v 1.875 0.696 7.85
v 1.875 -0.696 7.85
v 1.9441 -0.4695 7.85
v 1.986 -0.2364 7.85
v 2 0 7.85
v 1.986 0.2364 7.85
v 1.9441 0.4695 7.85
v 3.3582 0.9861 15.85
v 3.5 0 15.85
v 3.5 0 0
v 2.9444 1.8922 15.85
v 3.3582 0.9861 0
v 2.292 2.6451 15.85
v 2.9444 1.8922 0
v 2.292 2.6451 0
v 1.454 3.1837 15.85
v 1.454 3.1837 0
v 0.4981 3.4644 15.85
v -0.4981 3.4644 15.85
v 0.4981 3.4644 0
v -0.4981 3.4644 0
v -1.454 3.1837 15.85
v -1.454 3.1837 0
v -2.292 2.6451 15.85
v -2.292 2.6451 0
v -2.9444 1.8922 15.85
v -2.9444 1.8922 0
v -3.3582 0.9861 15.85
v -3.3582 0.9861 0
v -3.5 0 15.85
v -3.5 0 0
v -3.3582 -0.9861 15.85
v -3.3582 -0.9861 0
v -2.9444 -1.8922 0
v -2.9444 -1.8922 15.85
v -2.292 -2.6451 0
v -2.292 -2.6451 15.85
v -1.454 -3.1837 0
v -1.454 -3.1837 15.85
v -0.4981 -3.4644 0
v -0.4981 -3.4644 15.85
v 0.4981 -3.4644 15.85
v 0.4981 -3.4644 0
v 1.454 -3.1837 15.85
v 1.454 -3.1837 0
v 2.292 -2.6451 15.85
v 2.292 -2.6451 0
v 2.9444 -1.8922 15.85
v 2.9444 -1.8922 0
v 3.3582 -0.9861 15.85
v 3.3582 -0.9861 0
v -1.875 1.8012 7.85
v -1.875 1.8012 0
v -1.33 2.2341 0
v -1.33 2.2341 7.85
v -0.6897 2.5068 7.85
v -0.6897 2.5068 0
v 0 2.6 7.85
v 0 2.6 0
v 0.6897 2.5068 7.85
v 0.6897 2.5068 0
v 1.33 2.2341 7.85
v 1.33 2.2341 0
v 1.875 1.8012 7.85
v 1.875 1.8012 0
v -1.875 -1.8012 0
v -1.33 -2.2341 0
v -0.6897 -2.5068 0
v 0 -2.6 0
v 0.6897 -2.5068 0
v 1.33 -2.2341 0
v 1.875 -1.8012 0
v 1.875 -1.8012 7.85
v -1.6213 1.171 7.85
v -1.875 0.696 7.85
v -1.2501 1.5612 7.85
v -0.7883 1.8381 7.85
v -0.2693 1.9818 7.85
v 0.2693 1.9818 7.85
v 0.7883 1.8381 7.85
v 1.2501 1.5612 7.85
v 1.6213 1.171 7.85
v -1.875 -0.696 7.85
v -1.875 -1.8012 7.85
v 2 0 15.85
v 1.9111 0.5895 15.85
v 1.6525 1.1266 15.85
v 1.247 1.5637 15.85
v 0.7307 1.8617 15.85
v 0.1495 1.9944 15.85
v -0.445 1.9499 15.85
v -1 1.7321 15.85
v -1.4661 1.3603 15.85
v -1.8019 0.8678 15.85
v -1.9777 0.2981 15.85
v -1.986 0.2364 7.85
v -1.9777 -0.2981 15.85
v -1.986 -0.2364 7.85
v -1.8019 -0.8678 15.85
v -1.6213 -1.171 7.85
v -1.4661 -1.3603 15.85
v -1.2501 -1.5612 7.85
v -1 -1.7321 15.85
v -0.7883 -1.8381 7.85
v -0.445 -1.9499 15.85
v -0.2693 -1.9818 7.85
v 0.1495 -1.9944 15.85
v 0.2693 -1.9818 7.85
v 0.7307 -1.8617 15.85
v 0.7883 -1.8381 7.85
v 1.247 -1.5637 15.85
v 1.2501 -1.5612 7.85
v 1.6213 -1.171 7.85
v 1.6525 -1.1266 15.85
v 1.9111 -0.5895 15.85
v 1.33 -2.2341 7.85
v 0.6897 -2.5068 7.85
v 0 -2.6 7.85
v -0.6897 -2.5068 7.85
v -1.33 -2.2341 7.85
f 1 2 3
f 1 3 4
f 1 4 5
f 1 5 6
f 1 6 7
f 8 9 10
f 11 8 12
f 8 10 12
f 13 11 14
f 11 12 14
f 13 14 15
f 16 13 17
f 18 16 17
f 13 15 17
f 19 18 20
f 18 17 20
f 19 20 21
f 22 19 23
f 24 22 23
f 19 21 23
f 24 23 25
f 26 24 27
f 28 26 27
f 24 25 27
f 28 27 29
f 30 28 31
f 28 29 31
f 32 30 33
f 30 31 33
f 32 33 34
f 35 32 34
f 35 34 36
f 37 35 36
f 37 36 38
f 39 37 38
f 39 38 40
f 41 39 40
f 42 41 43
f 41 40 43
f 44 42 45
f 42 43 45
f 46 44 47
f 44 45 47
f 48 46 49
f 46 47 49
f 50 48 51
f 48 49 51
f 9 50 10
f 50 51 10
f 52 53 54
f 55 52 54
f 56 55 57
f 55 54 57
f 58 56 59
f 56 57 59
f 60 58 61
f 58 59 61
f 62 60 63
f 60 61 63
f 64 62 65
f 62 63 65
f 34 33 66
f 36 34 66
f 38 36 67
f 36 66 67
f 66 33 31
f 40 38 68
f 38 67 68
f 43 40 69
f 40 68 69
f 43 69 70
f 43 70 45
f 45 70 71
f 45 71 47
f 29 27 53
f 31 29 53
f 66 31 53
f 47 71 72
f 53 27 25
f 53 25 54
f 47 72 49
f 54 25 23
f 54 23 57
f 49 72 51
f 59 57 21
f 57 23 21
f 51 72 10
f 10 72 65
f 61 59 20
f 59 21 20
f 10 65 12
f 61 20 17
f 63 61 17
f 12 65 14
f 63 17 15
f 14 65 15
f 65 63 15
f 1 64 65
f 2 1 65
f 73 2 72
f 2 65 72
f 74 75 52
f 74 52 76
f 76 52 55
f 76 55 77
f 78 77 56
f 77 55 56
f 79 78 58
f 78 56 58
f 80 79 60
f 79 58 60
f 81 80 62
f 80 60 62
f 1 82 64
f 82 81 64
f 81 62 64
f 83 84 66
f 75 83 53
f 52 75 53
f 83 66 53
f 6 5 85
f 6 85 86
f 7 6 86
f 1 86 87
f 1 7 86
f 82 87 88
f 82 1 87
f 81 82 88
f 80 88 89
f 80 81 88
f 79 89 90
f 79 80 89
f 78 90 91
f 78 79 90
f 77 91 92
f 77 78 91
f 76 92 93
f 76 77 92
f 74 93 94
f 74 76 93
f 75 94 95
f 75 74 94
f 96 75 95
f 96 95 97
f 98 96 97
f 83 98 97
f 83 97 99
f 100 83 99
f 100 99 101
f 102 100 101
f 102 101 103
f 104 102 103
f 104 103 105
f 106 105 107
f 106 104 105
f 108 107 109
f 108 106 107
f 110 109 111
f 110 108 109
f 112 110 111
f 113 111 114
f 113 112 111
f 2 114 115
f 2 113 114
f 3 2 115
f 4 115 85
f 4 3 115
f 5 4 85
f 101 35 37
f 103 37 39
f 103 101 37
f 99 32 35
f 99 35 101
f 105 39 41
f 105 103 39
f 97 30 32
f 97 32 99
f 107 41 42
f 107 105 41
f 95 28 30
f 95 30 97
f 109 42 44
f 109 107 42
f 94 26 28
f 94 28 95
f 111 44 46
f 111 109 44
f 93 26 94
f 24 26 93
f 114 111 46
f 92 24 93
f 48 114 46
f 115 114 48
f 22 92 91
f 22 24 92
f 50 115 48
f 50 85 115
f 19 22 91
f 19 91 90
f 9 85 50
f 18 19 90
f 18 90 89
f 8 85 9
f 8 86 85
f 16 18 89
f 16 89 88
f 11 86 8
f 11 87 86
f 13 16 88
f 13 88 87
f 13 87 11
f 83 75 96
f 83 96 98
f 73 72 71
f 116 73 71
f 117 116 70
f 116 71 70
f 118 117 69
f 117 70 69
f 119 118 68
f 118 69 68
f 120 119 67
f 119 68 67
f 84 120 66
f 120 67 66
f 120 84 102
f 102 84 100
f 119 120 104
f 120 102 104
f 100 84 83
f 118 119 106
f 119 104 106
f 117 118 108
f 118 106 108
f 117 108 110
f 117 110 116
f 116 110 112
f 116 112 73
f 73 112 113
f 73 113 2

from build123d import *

# Parameters (mm, degrees)
F0_R     = 3.5
F1_DEPTH = 7.85
F2_R     = 3.5
F2_R_2   = 2
F3_DEPTH = 8


with BuildPart() as f1:
    # F0 (on Top) → F1 (new body)
    with BuildSketch(Plane.XY):
        Circle(F0_R)
        with BuildLine():
            ThreePointArc((1.875, 1.801215), (2.411949, 0.970824), (2.6, 0))
            ThreePointArc((2.6, 0), (2.411949, -0.970824), (1.875, -1.801215))
            ThreePointArc((1.875, -1.801215), (0, -2.6), (-1.875, -1.801215))
            ThreePointArc((-1.875, -1.801215), (-2.6, 0), (-1.875, 1.801215))
            ThreePointArc((-1.875, 1.801215), (0, 2.6), (1.875, 1.801215))
        make_face(mode=Mode.SUBTRACT)
        with BuildLine():
            ThreePointArc((1.875, -1.801215), (2.411949, -0.970824), (2.6, 0))
            ThreePointArc((2.6, 0), (2.411949, 0.970824), (1.875, 1.801215))
            Line((1.875, 1.801215), (1.875, -1.801215))
        make_face()
        with BuildLine():
            Line((-1.875, -1.801215), (-1.875, 1.801215))
            ThreePointArc((-1.875, 1.801215), (-2.6, 0), (-1.875, -1.801215))
        make_face()
    extrude(amount=F1_DEPTH)

    # F2 (on face) → F3 (join)
    with BuildSketch(Plane.XY.offset(7.85)):
        Circle(F2_R)
        Circle(F2_R_2, mode=Mode.SUBTRACT)
    extrude(amount=F3_DEPTH)


solid = f1.part
